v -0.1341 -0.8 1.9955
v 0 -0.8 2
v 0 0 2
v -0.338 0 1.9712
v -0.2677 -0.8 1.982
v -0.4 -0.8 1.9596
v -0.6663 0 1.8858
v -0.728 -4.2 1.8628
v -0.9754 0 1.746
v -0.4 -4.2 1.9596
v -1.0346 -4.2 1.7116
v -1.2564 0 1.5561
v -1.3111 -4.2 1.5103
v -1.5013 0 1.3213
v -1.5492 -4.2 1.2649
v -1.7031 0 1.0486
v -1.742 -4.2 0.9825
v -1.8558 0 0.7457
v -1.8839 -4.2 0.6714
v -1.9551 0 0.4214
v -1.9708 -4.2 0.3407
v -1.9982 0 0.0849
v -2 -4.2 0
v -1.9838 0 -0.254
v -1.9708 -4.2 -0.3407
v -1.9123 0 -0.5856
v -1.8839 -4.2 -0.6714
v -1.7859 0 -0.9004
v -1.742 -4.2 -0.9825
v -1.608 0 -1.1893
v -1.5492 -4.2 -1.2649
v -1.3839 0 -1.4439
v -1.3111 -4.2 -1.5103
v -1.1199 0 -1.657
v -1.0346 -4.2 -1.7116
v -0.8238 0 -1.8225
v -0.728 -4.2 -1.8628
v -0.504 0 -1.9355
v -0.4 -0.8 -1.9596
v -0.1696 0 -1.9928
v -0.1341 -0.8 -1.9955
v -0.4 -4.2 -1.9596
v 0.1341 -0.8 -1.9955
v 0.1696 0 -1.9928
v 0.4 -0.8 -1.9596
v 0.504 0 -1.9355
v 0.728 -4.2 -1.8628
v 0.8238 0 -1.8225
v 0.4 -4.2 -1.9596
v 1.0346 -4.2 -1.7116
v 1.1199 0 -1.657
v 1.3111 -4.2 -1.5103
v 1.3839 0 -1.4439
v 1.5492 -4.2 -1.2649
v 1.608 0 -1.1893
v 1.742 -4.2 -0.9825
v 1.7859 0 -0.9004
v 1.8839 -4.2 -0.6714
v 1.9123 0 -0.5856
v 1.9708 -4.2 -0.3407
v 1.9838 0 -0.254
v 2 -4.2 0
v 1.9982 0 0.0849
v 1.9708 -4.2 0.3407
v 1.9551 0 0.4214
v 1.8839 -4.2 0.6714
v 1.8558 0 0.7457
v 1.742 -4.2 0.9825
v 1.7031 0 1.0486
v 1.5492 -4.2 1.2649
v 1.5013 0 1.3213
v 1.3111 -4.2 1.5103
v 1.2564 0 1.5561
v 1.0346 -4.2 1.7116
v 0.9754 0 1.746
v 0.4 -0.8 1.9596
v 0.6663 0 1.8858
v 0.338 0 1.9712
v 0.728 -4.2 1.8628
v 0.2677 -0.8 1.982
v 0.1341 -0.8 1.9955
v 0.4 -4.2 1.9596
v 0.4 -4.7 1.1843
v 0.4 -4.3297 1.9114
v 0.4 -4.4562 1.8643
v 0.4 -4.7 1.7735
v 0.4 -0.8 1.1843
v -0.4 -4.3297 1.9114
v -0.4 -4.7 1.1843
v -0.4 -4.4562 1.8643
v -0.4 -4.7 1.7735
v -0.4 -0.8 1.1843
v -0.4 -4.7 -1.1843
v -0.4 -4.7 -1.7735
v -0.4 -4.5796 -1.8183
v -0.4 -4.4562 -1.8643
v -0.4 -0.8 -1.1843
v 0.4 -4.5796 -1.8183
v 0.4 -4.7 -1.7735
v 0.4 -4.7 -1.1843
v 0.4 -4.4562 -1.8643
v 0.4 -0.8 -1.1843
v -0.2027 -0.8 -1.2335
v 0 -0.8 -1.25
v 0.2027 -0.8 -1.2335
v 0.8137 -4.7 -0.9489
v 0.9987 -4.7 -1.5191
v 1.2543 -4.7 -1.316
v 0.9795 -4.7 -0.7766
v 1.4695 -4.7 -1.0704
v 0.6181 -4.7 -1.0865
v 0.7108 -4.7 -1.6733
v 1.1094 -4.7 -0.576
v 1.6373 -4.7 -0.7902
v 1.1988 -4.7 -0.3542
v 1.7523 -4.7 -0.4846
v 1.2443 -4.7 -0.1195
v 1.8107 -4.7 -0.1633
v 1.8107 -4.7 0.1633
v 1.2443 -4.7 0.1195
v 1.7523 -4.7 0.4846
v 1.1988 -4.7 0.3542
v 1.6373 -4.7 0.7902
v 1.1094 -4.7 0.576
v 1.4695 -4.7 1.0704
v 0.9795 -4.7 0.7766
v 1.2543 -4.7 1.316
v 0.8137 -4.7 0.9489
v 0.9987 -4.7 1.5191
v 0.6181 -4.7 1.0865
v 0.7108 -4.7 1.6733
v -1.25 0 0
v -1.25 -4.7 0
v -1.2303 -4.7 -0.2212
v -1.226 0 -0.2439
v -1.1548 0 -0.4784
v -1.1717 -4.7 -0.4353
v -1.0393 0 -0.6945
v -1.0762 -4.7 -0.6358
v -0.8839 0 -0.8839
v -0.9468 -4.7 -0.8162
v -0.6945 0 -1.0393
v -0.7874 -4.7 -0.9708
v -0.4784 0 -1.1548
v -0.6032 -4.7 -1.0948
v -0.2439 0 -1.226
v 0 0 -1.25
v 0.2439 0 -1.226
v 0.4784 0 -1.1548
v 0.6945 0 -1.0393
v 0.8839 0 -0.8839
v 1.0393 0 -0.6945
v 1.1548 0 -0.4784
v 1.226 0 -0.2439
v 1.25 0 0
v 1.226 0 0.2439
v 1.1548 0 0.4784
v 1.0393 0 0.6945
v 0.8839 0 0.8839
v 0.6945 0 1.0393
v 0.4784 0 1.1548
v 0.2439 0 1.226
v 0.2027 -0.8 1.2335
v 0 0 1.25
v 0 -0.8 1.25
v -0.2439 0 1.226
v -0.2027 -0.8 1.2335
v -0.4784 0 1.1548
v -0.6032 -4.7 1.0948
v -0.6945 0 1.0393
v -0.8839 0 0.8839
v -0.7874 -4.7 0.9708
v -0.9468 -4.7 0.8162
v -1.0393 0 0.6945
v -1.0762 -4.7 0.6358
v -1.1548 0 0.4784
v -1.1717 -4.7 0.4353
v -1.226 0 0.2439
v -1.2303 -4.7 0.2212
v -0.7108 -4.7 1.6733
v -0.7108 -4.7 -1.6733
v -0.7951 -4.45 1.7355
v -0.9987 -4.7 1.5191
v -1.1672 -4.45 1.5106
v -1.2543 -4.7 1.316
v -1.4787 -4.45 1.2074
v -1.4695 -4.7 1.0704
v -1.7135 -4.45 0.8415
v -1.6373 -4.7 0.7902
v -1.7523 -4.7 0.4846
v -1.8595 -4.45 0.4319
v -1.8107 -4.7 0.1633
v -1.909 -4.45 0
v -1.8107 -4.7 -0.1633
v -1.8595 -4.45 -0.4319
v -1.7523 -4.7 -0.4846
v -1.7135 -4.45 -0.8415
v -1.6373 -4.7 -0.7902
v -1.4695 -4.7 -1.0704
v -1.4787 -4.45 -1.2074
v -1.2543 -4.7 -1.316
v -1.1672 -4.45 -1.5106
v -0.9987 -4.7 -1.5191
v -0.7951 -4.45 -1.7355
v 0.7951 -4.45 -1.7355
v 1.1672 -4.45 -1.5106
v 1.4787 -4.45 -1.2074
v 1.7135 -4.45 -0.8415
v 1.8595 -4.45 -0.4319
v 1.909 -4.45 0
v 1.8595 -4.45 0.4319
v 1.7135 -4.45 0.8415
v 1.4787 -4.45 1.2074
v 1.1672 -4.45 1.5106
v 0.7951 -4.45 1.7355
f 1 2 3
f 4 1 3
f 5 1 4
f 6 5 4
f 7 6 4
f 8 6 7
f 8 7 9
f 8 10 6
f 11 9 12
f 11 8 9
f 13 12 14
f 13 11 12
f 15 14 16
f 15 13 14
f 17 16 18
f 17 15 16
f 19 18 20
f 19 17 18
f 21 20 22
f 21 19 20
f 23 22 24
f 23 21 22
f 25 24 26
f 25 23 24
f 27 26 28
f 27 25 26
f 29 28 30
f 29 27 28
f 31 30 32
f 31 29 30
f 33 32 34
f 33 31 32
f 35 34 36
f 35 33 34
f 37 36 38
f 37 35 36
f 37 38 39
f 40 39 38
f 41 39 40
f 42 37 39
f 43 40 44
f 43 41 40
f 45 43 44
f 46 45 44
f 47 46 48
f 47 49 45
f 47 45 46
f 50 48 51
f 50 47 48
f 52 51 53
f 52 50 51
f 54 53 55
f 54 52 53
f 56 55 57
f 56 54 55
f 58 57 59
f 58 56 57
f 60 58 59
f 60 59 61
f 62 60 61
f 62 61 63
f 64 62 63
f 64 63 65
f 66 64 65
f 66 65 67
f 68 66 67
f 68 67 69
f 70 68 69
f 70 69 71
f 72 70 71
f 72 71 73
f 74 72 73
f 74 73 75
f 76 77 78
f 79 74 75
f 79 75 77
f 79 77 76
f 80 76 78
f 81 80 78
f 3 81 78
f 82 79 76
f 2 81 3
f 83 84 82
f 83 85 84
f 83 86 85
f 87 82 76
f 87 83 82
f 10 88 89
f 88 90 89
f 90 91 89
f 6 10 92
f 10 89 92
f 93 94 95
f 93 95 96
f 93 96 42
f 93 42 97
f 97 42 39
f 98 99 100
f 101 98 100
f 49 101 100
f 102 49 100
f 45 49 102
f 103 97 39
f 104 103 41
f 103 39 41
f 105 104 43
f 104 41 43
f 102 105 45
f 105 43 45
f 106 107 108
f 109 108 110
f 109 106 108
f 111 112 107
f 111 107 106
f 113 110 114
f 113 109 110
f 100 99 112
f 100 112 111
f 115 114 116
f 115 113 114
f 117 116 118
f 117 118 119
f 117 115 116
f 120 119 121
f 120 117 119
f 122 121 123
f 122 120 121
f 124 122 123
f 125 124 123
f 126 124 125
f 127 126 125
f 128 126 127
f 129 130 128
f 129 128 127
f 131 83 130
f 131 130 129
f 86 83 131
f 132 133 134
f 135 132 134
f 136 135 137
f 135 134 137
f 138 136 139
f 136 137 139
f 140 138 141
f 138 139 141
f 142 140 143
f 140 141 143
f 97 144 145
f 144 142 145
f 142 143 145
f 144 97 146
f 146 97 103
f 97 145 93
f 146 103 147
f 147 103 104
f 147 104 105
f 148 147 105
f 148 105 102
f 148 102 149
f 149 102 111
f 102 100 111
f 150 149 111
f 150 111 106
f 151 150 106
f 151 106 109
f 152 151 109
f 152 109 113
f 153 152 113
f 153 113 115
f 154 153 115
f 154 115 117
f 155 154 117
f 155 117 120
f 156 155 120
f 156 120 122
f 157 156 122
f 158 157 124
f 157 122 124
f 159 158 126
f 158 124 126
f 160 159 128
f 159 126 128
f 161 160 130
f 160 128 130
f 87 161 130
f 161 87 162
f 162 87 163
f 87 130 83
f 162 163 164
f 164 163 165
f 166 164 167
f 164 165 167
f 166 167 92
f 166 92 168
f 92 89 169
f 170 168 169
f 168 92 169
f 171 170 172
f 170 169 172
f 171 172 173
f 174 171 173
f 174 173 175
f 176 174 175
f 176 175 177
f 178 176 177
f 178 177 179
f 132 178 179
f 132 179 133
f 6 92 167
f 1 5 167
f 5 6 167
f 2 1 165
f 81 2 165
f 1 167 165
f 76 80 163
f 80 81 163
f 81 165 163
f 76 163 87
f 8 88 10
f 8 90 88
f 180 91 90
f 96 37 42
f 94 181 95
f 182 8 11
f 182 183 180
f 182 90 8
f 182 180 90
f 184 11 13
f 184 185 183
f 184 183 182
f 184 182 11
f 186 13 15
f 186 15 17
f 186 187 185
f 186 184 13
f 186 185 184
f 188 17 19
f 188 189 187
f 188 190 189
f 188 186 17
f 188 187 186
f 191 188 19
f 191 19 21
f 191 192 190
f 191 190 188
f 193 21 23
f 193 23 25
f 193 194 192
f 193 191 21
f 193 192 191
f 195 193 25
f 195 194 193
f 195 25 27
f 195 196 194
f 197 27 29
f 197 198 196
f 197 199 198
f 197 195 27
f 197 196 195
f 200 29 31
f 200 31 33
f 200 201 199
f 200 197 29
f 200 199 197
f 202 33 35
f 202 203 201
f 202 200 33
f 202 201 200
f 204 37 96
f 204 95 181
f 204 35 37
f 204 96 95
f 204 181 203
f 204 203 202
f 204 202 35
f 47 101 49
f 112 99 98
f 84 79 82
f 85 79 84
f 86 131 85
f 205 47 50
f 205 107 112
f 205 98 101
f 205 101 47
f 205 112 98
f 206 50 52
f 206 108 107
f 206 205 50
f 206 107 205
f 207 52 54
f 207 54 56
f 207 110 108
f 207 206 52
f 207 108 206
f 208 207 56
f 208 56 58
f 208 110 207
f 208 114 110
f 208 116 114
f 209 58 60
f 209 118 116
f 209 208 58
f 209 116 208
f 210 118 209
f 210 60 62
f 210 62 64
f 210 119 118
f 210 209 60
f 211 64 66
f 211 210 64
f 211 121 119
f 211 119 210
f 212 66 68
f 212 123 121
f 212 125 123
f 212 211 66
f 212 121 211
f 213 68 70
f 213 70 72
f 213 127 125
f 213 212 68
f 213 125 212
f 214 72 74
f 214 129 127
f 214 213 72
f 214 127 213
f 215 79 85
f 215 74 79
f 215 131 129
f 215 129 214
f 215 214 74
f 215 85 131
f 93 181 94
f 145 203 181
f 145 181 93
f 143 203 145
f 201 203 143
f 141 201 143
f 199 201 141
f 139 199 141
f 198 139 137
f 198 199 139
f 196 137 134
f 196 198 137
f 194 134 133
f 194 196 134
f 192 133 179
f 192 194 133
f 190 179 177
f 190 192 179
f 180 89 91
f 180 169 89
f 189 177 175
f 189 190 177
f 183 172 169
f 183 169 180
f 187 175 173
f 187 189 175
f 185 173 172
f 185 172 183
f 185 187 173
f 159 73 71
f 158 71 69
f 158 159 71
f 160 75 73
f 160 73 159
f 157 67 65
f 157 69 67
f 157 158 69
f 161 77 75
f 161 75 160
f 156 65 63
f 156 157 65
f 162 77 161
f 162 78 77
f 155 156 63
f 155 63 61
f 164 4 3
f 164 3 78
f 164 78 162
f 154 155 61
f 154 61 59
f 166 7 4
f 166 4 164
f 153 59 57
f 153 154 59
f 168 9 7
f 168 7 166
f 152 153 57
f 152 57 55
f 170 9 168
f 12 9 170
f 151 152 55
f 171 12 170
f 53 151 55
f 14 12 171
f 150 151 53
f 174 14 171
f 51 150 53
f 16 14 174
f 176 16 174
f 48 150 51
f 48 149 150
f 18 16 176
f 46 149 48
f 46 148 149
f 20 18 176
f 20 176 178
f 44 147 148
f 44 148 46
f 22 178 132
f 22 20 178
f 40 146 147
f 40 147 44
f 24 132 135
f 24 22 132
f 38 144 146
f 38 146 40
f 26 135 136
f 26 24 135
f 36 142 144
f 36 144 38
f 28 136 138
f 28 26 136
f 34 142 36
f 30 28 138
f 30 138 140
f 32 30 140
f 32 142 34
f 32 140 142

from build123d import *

# Parameters (mm, degrees)
M3_TAPPED_HOLE1_D       = 2.5
CUT_EXTRUDE1_DEPTH      = 6.485435261
CUT_EXTRUDE1_DEPTH_BACK = 6.485435261
SKETCH2_W               = 0.8
SKETCH2_H               = 3.9


with BuildPart() as part:
    # Sketch1 → Revolve1 (revolve)
    with BuildSketch(Plane.XY, mode=Mode.PRIVATE) as revolve1_sk:
        Polygon((0, -4.7), (0, 0), (-2, 0), (-2, -4.2), (-1.818014883, -4.7), align=None)
    revolve(revolve1_sk.sketch.rotate(Axis((0, -4.7, 0), (0, -1, 0)), 270), axis=Axis((0, -4.7, 0), (0, -1, 0)))

    # M3 Tapped Hole1 (through all)
    with Locations(Plane(origin=(0, 0, 0), x_dir=(1, 0, 0), z_dir=(0, 1, 0))):
        with Locations((0, 0)):
            Hole(M3_TAPPED_HOLE1_D / 2)

    # Sketch2 → Cut-Extrude1 (cut, two sides: drawn at the far end of the back side and taken through both)
    with BuildSketch(Plane.XY.offset(-CUT_EXTRUDE1_DEPTH_BACK)):
        with Locations((0, -2.75)):
            Rectangle(SKETCH2_W, SKETCH2_H)
    extrude(amount=CUT_EXTRUDE1_DEPTH + CUT_EXTRUDE1_DEPTH_BACK, mode=Mode.SUBTRACT)


solid = part.part
